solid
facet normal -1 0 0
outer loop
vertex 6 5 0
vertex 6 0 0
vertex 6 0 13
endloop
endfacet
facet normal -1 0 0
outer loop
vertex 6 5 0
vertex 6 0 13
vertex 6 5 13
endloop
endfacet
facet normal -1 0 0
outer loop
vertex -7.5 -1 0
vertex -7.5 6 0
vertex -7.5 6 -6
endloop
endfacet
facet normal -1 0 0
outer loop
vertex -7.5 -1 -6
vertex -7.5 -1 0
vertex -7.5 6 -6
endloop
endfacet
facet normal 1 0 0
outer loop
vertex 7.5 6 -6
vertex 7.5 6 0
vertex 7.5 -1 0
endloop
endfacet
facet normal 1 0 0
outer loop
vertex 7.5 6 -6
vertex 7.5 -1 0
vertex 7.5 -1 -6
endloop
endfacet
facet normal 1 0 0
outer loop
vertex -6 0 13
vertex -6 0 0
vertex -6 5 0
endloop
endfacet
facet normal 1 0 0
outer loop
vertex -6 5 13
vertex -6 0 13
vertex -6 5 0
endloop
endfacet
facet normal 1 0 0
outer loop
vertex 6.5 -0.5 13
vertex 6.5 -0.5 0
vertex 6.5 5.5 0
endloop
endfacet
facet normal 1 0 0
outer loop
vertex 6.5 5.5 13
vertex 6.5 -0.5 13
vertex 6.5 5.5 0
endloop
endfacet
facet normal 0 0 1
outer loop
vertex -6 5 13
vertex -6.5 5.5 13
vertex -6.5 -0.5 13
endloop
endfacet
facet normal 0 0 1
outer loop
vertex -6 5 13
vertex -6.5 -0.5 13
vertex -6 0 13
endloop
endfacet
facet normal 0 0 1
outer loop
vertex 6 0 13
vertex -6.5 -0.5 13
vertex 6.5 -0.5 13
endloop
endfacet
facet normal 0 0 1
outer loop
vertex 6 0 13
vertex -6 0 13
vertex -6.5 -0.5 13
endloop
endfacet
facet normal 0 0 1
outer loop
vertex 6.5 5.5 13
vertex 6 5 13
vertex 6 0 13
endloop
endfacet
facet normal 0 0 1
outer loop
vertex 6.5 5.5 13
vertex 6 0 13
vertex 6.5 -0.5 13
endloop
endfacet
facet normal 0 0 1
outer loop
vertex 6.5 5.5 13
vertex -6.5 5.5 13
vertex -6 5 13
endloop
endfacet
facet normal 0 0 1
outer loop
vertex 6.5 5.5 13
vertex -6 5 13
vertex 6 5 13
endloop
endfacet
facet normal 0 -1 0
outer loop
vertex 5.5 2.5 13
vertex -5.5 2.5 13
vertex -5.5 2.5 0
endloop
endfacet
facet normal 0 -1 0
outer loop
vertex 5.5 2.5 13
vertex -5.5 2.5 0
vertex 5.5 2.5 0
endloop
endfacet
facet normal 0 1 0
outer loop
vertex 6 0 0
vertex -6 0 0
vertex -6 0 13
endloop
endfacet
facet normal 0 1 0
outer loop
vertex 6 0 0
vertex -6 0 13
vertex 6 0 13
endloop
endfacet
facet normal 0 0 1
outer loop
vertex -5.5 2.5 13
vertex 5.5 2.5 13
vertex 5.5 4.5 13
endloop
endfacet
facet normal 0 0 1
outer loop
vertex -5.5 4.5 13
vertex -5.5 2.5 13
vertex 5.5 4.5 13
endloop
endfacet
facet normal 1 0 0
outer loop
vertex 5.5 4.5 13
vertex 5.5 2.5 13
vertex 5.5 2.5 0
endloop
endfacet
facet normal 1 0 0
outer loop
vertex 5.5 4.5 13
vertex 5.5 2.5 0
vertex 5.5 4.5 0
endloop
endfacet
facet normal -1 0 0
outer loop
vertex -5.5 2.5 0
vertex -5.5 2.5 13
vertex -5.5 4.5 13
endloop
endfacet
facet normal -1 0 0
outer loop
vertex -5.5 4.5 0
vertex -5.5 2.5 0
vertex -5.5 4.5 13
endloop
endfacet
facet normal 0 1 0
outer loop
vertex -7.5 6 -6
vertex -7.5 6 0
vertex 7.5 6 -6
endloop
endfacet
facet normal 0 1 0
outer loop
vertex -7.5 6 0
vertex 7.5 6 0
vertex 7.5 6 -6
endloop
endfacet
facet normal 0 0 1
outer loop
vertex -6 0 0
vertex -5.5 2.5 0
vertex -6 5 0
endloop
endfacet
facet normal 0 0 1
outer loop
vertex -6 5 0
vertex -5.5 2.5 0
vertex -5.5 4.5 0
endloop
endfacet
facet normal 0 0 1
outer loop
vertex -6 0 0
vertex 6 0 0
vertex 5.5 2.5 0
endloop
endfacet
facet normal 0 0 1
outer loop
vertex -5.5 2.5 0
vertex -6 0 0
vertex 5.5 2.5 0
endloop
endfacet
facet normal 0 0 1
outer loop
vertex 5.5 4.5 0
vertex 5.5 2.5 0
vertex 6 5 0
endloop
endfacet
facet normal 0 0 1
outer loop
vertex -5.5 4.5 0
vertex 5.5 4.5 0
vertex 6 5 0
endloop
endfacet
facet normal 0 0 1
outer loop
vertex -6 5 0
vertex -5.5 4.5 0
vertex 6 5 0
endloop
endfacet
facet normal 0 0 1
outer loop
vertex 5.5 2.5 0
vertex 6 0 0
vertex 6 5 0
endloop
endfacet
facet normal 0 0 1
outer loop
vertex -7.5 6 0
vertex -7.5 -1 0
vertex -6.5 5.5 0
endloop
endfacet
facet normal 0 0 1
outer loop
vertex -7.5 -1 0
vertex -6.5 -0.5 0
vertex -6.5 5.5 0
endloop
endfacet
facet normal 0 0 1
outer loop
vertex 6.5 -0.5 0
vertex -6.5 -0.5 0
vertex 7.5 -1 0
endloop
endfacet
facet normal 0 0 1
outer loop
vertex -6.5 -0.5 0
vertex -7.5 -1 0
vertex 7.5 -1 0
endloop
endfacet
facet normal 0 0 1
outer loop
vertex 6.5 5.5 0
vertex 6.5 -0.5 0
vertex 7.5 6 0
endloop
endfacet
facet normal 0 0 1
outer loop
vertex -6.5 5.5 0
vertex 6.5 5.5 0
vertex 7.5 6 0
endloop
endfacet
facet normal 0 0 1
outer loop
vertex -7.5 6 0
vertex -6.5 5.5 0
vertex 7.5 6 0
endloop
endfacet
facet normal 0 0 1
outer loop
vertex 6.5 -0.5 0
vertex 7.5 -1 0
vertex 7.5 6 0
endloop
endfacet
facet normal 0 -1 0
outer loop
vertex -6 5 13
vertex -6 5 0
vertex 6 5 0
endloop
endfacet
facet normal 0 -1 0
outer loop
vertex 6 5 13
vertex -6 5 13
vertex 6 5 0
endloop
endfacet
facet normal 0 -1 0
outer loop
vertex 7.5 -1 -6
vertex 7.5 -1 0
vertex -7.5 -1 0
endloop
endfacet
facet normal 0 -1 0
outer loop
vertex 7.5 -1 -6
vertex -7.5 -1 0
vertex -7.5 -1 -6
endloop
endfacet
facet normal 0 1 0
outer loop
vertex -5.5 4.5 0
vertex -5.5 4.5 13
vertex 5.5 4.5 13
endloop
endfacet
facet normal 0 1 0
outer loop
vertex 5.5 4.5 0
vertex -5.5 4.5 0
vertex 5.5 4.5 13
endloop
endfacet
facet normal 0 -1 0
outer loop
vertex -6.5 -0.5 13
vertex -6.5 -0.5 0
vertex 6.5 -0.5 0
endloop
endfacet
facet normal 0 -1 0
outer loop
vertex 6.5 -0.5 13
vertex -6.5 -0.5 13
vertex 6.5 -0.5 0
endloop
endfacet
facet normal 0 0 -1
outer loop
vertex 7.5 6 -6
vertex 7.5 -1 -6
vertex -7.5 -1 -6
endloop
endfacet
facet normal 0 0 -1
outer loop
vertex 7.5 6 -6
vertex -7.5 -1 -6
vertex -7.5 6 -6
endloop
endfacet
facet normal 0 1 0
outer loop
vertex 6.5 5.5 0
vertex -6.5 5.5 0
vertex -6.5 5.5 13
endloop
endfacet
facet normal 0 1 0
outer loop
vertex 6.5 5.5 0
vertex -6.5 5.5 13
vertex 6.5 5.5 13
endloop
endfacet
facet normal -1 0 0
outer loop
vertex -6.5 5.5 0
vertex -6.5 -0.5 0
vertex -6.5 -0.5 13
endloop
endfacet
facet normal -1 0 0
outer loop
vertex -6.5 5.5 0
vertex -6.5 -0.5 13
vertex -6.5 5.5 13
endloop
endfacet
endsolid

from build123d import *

# Parameters (mm, degrees)
SKETCH_1_W          = 13
SKETCH_1_H          = 5
SKETCH_1_W_2        = 6
SKETCH_1_H_2        = 7
EXTRUDE_1_DEPTH     = 6
SKETCH_3_W          = 6
SKETCH_3_H          = 7
EXTRUDE_2_DEPTH     = 7.5
SKETCH_4_W          = 12
SKETCH_4_H          = 5
SKETCH_4_W_2        = 11
SKETCH_4_H_2        = 2
CUT_EXTRUDE_1_DEPTH = 13
SKETCH_5_W          = 13
SKETCH_5_H          = 6
SKETCH_5_W_2        = 12
SKETCH_5_H_2        = 5
EXTRUDE_1_2_DEPTH   = 13


with BuildPart() as part:
    # 草图1 → Extrude 1 (new body, symmetric)
    with BuildSketch(Plane(origin=(0, 0, 0), x_dir=(0, 0, -1), z_dir=(1, 0, 0))):
        with Locations((-6.5, 2.5)):
            Rectangle(SKETCH_1_W, SKETCH_1_H)
        with Locations((3, 2.5)):
            Rectangle(SKETCH_1_W_2, SKETCH_1_H_2)
    extrude(amount=EXTRUDE_1_DEPTH, both=True)

    # 草图3 → 凸台-拉伸2 (add, symmetric)
    with BuildSketch(Plane(origin=(0, 0, 0), x_dir=(0, 0, -1), z_dir=(1, 0, 0))):
        with Locations((3, 2.5)):
            Rectangle(SKETCH_3_W, SKETCH_3_H)
    extrude(amount=EXTRUDE_2_DEPTH, both=True)

    # 草图4 → 切除-拉伸1 (cut)
    with BuildSketch(Plane.XY.offset(13)):
        with Locations((0, 2.5)):
            Rectangle(SKETCH_4_W, SKETCH_4_H)
        with Locations((0, 3.5)):
            Rectangle(SKETCH_4_W_2, SKETCH_4_H_2, mode=Mode.SUBTRACT)
    extrude(amount=-CUT_EXTRUDE_1_DEPTH, mode=Mode.SUBTRACT)

    # 草图5 → Extrude 1 2 (add)
    with BuildSketch(Plane.XY):
        with Locations((0, 2.5)):
            Rectangle(SKETCH_5_W, SKETCH_5_H)
        with Locations((0, 2.5)):
            Rectangle(SKETCH_5_W_2, SKETCH_5_H_2, mode=Mode.SUBTRACT)
    extrude(amount=EXTRUDE_1_2_DEPTH)


solid = part.part
